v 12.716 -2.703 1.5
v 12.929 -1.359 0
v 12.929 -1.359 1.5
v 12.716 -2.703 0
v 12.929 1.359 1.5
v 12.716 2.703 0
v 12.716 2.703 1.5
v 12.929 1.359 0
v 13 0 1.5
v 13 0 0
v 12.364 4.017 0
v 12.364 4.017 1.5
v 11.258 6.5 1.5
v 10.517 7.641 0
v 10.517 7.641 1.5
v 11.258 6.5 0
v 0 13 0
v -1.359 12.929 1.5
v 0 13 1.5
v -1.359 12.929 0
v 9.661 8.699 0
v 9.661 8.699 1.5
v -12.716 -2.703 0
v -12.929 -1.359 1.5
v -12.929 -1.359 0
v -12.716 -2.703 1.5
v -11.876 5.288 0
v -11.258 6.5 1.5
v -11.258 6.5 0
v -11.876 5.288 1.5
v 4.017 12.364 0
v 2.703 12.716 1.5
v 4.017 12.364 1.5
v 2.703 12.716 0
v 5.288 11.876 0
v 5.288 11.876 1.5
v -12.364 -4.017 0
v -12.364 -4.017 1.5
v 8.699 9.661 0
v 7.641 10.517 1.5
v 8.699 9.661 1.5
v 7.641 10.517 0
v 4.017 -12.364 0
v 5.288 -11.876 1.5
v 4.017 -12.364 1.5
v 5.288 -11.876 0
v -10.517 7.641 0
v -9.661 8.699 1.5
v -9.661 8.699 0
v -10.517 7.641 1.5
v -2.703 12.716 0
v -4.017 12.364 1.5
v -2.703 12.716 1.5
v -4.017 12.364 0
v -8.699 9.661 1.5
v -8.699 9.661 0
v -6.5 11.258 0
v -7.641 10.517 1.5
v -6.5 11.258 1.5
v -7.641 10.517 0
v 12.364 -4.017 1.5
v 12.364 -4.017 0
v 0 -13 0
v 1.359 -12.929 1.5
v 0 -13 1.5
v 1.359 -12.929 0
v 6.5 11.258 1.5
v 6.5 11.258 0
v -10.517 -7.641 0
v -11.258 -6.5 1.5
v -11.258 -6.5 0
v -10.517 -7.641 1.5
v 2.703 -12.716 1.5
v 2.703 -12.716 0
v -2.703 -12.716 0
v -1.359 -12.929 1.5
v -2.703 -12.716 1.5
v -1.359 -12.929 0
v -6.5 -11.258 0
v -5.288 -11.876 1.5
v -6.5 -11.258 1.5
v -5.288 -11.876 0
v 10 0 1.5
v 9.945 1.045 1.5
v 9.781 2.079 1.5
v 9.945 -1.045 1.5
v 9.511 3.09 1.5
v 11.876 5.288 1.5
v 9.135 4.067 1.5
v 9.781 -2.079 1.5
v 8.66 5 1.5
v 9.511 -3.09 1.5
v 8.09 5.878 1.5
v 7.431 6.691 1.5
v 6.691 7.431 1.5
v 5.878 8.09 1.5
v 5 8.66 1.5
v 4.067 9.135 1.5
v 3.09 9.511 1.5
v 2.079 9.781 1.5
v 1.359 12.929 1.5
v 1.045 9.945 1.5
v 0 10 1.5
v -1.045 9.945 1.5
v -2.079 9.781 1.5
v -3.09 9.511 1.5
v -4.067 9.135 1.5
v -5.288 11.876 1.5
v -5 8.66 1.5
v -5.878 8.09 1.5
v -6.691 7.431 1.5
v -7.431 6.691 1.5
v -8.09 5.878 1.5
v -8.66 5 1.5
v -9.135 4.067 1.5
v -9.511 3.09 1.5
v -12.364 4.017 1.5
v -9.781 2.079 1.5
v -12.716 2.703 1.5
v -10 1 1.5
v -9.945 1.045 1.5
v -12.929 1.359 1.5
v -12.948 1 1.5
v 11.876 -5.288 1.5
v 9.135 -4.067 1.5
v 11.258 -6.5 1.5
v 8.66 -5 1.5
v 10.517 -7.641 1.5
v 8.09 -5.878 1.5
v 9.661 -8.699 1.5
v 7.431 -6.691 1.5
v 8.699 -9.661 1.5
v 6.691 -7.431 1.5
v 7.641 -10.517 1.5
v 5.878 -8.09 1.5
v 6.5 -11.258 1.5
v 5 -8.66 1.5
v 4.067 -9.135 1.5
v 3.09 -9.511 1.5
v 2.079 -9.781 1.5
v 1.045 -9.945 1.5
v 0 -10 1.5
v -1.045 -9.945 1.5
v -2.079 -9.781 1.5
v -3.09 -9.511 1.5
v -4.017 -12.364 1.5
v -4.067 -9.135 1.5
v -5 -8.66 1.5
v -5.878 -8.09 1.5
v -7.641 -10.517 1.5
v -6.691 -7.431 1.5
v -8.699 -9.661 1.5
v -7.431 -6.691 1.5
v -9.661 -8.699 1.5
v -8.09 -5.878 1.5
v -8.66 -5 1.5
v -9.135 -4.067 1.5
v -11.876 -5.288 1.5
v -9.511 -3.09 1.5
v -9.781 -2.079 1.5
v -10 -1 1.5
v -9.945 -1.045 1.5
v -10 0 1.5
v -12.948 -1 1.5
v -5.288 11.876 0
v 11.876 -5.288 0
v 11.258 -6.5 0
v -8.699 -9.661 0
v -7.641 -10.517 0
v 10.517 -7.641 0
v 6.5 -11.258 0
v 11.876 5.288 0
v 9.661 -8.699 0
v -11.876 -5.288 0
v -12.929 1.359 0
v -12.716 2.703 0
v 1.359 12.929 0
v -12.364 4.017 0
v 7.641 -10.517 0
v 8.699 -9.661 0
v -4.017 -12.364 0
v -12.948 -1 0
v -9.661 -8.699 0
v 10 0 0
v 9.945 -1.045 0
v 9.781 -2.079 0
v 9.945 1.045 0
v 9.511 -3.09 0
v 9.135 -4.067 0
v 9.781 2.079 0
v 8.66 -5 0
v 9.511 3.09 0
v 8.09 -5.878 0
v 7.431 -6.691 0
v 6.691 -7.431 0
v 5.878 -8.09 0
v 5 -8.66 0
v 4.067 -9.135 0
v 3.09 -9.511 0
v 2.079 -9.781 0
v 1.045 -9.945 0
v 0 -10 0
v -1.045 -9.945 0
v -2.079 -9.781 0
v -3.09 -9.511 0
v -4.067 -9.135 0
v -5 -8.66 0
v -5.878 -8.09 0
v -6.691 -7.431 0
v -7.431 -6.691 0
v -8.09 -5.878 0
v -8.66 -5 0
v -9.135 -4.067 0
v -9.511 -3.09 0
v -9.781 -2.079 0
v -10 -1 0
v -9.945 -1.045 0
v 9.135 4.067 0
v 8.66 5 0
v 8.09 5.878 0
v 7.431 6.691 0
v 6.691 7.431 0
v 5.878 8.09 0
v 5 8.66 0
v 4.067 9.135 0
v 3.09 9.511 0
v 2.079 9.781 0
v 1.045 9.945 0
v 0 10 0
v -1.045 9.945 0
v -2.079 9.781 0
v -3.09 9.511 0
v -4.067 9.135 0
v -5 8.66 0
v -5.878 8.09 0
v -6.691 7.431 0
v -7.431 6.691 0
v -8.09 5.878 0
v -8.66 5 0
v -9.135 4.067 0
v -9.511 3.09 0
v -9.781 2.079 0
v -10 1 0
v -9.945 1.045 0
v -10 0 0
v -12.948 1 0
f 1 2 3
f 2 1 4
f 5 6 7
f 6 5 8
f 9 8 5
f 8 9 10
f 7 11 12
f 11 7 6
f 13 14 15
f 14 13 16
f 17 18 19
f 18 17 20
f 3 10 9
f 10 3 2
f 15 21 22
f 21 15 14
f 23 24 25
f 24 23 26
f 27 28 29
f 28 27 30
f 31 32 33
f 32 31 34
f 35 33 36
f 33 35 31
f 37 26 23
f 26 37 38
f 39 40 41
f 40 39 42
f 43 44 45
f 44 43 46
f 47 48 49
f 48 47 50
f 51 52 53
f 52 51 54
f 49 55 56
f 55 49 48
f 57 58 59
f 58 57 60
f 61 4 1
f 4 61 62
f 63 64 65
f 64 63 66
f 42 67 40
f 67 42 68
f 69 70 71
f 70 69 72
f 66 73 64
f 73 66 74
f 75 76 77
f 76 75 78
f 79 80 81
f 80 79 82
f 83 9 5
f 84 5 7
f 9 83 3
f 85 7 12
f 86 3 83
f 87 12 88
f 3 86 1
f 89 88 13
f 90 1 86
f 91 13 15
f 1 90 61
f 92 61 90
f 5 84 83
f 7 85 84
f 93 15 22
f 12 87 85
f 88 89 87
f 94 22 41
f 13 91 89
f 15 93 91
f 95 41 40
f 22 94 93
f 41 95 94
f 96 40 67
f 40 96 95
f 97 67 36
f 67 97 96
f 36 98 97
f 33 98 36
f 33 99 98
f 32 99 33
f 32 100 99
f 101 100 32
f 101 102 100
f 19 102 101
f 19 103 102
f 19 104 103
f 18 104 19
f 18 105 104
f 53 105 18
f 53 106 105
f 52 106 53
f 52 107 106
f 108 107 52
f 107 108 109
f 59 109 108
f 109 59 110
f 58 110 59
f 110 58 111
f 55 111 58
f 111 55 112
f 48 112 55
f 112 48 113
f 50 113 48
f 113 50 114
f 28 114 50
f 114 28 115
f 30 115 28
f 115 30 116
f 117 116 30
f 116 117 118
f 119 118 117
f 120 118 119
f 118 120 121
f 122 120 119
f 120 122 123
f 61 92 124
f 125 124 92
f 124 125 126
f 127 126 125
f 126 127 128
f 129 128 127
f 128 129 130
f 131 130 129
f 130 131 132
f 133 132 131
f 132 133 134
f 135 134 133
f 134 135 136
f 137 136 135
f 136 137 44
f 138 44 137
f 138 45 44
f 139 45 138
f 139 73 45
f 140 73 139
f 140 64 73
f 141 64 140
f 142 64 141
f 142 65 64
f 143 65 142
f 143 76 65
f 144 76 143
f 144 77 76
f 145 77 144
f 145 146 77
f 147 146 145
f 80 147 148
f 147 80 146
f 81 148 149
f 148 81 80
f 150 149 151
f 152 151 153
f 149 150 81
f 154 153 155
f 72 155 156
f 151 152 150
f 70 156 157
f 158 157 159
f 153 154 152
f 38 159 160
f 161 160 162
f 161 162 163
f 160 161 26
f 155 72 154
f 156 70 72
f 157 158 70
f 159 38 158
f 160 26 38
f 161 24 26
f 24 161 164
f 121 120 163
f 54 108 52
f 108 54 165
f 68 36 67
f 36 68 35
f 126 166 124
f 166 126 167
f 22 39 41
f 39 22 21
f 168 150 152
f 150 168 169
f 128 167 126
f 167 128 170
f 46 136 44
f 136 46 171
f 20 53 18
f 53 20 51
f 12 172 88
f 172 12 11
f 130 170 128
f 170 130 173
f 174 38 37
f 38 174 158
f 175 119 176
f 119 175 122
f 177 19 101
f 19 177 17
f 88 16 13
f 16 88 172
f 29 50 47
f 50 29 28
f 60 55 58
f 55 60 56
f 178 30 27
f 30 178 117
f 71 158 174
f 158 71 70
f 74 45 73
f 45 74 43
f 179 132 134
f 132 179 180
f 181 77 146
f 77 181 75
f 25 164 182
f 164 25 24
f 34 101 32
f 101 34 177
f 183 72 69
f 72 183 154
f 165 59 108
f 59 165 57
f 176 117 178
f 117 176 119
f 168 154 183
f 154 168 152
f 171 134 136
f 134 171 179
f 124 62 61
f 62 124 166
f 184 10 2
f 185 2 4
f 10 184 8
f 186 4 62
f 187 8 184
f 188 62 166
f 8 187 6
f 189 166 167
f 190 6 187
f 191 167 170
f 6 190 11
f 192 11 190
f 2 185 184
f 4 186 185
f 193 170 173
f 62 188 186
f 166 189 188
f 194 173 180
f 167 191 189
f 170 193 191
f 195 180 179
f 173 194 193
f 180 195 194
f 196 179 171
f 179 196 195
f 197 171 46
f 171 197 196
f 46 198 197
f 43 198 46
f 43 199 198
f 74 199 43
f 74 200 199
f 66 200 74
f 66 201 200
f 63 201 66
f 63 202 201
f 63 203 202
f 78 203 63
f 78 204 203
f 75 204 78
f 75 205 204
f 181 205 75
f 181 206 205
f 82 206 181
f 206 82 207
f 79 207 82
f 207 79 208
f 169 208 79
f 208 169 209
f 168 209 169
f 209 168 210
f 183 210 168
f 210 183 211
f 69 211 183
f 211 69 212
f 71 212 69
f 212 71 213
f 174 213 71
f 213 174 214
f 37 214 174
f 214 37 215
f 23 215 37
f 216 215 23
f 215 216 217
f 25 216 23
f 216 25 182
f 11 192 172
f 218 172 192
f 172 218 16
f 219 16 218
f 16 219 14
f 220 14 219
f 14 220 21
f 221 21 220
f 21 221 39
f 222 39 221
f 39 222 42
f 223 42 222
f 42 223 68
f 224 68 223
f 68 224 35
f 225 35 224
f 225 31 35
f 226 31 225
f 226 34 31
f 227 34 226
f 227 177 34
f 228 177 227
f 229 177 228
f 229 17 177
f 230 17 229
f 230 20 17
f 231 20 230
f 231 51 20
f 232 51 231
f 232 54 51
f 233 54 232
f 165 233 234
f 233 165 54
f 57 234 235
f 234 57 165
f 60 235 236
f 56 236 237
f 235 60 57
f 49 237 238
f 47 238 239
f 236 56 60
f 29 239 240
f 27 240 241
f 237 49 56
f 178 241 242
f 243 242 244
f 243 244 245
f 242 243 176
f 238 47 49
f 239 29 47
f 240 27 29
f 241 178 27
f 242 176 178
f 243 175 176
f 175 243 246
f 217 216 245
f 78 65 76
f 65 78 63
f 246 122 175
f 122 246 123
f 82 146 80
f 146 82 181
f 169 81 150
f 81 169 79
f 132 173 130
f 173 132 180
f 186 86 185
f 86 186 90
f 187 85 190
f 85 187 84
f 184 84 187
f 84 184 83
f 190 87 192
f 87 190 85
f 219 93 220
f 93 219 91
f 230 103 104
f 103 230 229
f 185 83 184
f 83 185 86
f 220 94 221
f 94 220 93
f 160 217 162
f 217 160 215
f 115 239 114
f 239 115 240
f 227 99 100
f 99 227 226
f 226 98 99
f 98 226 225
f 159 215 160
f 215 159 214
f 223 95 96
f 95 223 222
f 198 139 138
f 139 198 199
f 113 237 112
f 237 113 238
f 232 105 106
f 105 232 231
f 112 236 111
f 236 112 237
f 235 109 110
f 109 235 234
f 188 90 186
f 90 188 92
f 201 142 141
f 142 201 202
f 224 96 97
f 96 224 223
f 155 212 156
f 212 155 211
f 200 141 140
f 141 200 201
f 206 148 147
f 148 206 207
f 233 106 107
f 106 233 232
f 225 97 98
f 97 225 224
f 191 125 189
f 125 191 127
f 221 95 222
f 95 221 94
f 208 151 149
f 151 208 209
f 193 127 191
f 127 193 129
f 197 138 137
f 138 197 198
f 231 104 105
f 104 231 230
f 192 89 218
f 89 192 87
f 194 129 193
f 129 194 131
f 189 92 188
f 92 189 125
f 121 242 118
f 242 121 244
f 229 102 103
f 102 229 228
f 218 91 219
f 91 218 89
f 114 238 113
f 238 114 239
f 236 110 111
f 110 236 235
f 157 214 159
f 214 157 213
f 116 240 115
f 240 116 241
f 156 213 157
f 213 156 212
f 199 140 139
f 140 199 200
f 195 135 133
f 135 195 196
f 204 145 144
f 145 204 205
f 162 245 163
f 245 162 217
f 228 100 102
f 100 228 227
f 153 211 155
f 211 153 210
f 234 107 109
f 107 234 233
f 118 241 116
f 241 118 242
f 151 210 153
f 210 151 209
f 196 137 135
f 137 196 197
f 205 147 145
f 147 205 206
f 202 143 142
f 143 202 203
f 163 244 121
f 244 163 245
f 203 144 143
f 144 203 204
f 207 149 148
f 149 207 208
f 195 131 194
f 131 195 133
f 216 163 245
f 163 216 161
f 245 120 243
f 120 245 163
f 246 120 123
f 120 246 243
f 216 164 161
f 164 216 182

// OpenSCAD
// Internal retaining ring.
$fn = 60;
eps = 0.02;
inner_d = 20;
outer_d = 26;
thickness = max(1.5, 1.5);
difference() { cylinder(d=outer_d,h=thickness); translate([0,0,-eps]) cylinder(d=inner_d,h=thickness+2*eps); translate([-outer_d/2-eps,-1,-eps]) cube([outer_d/2-inner_d/2+eps,2,thickness+2*eps]); }
